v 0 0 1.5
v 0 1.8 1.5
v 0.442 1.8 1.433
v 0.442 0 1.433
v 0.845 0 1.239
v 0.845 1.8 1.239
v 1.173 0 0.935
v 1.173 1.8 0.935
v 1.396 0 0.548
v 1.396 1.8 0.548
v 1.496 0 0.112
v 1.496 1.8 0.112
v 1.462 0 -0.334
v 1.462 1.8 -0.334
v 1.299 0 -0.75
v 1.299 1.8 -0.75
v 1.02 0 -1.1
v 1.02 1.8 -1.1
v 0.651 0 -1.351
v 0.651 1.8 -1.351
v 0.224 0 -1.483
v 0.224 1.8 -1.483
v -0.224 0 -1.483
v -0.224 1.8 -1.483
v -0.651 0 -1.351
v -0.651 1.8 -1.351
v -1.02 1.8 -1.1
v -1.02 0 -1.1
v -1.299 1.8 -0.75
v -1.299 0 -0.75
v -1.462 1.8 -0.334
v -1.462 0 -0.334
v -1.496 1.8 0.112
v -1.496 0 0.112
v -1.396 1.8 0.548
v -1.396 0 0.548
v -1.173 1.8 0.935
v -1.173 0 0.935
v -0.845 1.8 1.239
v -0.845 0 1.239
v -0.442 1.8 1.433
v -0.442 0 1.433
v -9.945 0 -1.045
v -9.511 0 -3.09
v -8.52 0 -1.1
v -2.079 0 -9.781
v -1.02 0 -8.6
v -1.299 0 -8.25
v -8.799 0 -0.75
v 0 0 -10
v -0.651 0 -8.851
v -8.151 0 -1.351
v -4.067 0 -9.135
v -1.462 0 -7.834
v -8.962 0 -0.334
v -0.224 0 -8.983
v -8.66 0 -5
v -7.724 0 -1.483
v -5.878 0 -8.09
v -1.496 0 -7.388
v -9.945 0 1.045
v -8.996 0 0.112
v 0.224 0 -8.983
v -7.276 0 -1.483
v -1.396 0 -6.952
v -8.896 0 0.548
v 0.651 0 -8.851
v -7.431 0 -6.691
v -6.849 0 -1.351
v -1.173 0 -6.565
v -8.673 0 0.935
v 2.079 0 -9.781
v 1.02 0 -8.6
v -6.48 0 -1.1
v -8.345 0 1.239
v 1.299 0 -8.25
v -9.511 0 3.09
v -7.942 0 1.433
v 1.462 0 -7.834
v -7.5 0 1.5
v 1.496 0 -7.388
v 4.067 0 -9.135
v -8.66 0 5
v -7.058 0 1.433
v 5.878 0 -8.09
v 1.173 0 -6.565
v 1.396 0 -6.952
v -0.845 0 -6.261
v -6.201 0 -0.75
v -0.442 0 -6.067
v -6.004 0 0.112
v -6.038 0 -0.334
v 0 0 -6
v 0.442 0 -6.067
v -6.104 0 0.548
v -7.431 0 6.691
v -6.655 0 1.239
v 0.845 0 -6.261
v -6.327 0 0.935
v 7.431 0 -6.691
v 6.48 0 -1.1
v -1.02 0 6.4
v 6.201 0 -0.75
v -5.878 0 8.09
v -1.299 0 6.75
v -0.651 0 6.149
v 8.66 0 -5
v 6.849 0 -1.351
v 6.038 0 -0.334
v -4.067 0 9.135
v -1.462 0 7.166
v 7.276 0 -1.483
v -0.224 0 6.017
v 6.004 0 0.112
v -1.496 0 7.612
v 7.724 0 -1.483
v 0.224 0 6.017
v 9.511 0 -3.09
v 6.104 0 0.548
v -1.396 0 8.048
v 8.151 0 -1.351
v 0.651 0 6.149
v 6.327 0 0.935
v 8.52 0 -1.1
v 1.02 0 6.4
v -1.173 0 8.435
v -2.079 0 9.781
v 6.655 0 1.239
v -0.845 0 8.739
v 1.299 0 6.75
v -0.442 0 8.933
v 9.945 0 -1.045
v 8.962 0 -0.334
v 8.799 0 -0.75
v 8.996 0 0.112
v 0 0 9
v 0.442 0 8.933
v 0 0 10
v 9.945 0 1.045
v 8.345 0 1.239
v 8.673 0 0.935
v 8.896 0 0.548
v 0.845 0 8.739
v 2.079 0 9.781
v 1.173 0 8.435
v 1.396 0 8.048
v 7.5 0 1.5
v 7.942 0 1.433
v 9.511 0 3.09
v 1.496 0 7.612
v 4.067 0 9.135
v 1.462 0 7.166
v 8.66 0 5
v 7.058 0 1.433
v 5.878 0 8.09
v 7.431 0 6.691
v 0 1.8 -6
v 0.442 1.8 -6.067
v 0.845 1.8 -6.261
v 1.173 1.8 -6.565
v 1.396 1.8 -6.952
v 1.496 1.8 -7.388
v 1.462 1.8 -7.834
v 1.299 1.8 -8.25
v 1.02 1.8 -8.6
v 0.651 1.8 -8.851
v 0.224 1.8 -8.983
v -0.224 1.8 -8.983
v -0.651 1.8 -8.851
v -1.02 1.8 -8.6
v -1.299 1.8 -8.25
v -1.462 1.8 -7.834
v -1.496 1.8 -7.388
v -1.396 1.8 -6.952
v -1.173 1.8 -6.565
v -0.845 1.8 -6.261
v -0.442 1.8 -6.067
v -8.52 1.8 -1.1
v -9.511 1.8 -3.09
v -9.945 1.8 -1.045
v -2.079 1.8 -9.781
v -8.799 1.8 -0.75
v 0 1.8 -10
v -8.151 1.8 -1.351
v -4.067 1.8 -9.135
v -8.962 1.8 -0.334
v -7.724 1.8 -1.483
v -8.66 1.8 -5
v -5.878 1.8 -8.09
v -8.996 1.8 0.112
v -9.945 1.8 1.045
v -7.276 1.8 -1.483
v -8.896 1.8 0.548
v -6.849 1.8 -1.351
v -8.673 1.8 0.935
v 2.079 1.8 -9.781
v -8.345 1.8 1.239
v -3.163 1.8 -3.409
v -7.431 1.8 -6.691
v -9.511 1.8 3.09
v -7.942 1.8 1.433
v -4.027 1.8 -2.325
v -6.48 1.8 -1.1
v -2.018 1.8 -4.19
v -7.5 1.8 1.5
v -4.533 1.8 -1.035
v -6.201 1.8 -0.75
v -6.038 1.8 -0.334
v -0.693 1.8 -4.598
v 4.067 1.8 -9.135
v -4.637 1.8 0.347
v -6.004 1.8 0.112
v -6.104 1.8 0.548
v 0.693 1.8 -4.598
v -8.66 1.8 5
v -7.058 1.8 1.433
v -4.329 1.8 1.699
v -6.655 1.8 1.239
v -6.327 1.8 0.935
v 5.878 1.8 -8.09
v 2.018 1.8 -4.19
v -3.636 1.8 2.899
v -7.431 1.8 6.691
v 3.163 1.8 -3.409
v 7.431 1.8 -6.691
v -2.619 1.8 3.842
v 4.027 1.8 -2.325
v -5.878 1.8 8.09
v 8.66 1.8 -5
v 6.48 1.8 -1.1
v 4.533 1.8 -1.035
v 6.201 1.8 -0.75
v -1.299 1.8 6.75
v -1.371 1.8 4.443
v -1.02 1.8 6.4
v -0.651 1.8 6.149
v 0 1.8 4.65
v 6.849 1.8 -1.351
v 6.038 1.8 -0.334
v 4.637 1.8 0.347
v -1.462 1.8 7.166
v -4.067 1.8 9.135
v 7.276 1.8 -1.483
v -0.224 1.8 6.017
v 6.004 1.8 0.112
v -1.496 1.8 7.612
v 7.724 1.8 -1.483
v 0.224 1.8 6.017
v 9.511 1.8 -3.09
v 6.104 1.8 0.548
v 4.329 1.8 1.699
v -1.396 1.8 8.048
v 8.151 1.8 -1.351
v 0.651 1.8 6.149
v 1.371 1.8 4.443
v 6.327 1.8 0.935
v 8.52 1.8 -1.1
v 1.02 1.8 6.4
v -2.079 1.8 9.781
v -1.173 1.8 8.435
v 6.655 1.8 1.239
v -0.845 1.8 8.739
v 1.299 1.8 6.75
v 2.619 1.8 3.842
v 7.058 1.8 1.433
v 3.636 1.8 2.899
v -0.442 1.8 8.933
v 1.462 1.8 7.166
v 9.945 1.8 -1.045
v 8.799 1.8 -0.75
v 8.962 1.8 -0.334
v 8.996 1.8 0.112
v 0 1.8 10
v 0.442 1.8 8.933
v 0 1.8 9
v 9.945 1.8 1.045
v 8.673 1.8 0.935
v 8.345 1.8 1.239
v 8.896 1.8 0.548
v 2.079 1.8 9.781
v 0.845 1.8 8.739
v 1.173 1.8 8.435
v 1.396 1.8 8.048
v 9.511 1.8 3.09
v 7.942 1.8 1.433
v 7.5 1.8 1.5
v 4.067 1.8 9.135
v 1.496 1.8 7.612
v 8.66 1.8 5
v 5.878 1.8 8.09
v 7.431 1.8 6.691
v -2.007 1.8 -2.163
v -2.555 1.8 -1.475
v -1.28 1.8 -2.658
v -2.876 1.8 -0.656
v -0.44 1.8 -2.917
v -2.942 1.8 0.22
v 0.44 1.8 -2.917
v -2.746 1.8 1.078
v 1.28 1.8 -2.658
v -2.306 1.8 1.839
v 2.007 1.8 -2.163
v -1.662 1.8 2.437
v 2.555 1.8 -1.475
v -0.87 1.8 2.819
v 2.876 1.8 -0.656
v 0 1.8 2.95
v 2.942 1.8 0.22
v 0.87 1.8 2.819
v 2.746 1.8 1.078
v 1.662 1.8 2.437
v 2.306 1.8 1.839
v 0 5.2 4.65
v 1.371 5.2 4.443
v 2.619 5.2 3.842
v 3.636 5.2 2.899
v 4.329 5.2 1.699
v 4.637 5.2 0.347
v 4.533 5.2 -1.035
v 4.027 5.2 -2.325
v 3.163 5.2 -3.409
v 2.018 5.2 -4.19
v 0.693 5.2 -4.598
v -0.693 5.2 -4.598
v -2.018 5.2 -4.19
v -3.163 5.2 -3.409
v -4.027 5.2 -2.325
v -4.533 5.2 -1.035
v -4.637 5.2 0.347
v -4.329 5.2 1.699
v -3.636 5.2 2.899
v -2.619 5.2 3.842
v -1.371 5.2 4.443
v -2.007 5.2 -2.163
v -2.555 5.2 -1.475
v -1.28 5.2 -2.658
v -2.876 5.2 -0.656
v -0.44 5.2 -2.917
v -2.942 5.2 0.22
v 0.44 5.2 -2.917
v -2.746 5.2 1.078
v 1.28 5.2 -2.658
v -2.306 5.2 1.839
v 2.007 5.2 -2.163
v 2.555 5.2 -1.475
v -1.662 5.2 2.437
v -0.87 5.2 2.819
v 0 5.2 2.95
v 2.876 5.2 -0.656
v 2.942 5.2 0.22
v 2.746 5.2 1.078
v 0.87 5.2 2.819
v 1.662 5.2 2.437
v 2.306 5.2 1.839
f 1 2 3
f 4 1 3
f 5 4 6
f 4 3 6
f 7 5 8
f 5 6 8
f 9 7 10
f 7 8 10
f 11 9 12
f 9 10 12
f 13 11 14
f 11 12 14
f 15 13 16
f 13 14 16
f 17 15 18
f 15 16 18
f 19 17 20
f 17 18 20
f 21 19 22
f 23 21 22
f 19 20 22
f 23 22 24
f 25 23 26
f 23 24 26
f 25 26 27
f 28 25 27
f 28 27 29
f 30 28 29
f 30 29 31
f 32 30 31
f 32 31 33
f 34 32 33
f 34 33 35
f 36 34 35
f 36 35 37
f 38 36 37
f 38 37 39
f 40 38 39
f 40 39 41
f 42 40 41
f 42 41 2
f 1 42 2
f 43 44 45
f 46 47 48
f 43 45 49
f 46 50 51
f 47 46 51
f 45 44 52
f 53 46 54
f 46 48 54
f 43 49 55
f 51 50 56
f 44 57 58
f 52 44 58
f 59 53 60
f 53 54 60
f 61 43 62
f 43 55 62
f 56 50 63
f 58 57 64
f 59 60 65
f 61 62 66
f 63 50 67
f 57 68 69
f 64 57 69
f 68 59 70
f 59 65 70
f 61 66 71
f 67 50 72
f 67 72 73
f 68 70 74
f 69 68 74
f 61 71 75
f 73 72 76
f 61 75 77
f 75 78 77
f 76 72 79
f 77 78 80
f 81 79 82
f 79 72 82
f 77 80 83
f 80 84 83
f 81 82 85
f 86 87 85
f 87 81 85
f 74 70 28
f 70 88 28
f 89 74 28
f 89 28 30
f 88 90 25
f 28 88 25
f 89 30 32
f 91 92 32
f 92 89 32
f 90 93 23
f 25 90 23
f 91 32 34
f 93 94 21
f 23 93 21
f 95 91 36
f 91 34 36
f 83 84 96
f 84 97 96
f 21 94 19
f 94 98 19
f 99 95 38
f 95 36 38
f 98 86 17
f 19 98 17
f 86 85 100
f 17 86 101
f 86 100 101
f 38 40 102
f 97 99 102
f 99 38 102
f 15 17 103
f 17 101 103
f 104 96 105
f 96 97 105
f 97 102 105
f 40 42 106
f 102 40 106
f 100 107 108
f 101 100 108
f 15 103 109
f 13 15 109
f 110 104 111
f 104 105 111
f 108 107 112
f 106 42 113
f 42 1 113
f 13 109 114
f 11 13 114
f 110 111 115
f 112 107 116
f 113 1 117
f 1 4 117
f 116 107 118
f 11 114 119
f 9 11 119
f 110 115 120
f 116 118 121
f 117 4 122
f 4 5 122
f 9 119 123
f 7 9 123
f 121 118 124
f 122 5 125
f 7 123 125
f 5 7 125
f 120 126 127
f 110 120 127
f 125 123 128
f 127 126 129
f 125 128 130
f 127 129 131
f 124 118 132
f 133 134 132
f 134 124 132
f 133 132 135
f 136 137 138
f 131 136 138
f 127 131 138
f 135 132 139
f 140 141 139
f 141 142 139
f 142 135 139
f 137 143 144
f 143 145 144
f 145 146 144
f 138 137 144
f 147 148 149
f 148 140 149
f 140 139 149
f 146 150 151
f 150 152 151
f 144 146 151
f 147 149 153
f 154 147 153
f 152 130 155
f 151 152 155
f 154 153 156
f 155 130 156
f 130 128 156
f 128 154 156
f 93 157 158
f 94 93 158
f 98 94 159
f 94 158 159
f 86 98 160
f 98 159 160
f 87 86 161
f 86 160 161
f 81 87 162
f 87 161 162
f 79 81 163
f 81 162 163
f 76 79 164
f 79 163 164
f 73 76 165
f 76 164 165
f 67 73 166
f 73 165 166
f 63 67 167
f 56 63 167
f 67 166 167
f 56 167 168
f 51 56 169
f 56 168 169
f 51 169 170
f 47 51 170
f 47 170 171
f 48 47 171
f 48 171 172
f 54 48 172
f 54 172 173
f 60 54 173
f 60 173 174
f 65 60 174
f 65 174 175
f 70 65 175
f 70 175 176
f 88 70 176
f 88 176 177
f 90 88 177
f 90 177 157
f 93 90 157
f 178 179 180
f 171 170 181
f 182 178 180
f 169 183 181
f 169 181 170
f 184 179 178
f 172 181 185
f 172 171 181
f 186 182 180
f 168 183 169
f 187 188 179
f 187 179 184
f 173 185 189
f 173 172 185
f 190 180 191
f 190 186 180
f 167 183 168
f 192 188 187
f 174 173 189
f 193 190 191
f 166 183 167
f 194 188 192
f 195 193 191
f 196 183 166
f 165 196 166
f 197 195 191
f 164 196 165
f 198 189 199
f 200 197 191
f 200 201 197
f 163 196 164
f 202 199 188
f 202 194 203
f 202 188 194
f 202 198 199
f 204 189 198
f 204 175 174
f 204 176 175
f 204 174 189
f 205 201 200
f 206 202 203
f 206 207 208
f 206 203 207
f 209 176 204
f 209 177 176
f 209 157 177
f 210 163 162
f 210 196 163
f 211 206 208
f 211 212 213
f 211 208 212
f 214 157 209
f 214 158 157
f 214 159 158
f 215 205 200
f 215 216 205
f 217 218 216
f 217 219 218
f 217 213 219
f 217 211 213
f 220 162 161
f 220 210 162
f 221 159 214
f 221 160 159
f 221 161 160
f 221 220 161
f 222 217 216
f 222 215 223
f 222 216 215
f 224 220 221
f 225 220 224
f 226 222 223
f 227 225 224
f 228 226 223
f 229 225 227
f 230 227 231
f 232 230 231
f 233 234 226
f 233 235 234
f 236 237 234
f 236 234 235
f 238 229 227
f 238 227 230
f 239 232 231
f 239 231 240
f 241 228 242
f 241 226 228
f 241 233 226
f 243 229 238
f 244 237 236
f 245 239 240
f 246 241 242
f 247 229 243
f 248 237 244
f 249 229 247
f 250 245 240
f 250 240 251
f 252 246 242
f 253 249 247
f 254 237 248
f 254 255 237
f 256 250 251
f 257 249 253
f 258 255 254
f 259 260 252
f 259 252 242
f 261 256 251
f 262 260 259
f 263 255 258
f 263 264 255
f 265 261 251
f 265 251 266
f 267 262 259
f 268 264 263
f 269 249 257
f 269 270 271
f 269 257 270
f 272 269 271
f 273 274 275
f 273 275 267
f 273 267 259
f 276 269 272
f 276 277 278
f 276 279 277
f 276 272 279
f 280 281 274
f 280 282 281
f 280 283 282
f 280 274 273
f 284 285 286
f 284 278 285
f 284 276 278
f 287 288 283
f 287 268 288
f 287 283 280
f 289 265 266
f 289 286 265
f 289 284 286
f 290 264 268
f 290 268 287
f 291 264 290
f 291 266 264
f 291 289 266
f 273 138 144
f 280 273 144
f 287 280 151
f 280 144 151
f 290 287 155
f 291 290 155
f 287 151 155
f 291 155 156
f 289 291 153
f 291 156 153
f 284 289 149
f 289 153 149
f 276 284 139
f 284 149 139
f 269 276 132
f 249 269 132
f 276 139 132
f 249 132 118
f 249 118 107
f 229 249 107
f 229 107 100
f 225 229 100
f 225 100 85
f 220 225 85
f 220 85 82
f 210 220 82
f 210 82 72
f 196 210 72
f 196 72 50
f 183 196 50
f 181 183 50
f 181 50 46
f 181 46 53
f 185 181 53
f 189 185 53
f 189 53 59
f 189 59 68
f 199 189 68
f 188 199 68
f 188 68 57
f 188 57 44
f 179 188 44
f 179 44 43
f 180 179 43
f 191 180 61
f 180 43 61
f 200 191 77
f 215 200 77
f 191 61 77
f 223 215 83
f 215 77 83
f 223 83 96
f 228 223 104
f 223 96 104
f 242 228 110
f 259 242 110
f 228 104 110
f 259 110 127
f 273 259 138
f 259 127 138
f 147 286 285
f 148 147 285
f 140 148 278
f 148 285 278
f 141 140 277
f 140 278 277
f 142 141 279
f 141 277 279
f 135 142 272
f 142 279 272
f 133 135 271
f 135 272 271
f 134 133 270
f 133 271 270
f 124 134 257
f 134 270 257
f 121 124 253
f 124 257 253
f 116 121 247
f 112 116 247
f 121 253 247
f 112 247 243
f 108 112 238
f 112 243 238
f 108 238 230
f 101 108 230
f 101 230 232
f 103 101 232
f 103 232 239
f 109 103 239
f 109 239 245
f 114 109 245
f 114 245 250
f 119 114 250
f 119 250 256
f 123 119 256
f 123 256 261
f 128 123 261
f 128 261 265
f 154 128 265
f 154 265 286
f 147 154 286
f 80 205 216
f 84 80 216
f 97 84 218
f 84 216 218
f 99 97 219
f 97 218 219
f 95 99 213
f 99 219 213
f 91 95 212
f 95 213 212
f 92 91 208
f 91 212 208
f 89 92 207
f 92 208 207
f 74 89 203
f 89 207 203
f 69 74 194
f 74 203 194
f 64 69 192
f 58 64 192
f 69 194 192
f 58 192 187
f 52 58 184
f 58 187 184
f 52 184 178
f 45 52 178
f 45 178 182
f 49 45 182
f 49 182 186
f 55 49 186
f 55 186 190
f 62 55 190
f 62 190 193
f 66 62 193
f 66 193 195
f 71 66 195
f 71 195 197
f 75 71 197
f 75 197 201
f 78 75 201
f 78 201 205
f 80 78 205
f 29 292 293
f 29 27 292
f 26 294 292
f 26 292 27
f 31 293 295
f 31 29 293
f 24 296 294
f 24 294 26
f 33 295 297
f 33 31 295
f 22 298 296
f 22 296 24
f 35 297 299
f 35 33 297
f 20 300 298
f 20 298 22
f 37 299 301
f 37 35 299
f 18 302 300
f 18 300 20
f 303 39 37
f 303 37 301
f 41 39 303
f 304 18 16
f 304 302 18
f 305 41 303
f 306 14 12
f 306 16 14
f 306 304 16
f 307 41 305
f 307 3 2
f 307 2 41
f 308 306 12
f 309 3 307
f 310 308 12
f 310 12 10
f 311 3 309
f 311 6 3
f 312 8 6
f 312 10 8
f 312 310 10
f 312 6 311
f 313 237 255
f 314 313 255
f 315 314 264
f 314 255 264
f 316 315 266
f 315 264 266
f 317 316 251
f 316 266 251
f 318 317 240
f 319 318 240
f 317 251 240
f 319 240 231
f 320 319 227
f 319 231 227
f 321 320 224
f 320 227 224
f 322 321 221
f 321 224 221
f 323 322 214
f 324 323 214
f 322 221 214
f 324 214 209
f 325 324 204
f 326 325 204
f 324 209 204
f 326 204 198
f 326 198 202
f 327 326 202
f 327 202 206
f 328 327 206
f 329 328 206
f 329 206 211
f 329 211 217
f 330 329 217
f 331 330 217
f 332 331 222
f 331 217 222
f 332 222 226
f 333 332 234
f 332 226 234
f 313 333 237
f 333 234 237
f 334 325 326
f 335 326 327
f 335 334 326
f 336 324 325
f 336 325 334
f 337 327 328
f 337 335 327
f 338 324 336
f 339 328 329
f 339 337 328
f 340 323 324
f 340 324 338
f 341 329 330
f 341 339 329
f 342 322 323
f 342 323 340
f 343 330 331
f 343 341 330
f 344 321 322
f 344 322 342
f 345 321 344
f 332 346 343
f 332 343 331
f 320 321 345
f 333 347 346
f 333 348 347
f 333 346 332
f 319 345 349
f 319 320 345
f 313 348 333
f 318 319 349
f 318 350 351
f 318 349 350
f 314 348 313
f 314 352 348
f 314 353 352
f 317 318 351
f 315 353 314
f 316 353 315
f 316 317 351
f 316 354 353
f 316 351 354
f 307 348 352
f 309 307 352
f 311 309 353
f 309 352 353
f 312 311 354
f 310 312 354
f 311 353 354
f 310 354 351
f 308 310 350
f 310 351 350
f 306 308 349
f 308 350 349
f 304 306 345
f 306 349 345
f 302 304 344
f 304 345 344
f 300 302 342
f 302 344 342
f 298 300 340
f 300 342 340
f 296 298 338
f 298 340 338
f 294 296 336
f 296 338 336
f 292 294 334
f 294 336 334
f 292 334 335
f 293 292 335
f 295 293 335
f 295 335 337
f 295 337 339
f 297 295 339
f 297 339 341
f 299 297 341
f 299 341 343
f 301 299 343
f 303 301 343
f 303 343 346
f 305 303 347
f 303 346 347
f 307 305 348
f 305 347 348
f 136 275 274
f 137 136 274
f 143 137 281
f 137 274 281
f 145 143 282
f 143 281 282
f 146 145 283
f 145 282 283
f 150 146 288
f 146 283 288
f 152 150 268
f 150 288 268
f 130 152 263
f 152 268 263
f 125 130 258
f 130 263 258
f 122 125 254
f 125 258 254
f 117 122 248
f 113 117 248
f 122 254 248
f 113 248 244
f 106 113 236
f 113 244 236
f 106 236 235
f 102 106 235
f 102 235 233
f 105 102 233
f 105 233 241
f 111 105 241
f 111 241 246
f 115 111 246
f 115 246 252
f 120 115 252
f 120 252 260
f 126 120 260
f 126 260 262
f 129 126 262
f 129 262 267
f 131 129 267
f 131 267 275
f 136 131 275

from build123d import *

# Parameters (mm, degrees)
SKETCH1_R           = 10
BOSS_EXTRUDE1_DEPTH = 5.2
CUT_EXTRUDE1_START  = -3.4
SKETCH2_R           = 10
SKETCH2_R_2         = 4.65
CUT_EXTRUDE1_DEPTH  = 3.4
CUT_EXTRUDE2_REACH  = 16.545
SKETCH3_R           = 1.5
SKETCH4_R           = 2.95
CUT_EXTRUDE3_DEPTH  = 3.4


with BuildPart() as part:
    # Sketch1 → Boss-Extrude1 (new body)
    with BuildSketch(Plane(origin=(0, 0, 0), x_dir=(1, 0, 0), z_dir=(0, 1, 0))):
        with Locations(Location((0, 0, 0), (0, 0, 270))):
            Circle(SKETCH1_R)
    extrude(amount=BOSS_EXTRUDE1_DEPTH)

    # Sketch2 → Cut-Extrude1 (cut)
    with BuildSketch(Plane(origin=(0, 5.2, 0), x_dir=(1, 0, 0), z_dir=(0, 1, 0)).offset(CUT_EXTRUDE1_START)):
        with Locations(Location((0, 0, 0), (0, 0, 270))):
            Circle(SKETCH2_R)
        with Locations(Location((0, 0, 0), (0, 0, 270))):
            Circle(SKETCH2_R_2, mode=Mode.SUBTRACT)
    extrude(amount=CUT_EXTRUDE1_DEPTH, mode=Mode.SUBTRACT)

    # Sketch3 → Cut-Extrude2 (cut, up to next)
    with BuildSketch(Plane(origin=(0, 1.8, 0), x_dir=(1, 0, 0), z_dir=(0, 1, 0)), mode=Mode.PRIVATE) as cut_extrude2_sk1:
        with Locations(Location((0, 0, 0), (0, 0, 270))):
            Circle(SKETCH3_R)
    cut_extrude2_tool1 = extrude(cut_extrude2_sk1.sketch, amount=-CUT_EXTRUDE2_REACH, mode=Mode.PRIVATE) & part.part
    # Sketch3 → Cut-Extrude2 (cut, up to next)
    with BuildSketch(Plane(origin=(0, 1.8, 0), x_dir=(1, 0, 0), z_dir=(0, 1, 0)), mode=Mode.PRIVATE) as cut_extrude2_sk2:
        with Locations(Location((-7.5, 0, 0), (0, 0, 270))):
            Circle(SKETCH3_R)
    cut_extrude2_tool2 = extrude(cut_extrude2_sk2.sketch, amount=-CUT_EXTRUDE2_REACH, mode=Mode.PRIVATE) & part.part
    # Sketch3 → Cut-Extrude2 (cut, up to next)
    with BuildSketch(Plane(origin=(0, 1.8, 0), x_dir=(1, 0, 0), z_dir=(0, 1, 0)), mode=Mode.PRIVATE) as cut_extrude2_sk3:
        with Locations(Location((0, 7.5, 0), (0, 0, 270))):
            Circle(SKETCH3_R)
    cut_extrude2_tool3 = extrude(cut_extrude2_sk3.sketch, amount=-CUT_EXTRUDE2_REACH, mode=Mode.PRIVATE) & part.part
    # Sketch3 → Cut-Extrude2 (cut, up to next)
    with BuildSketch(Plane(origin=(0, 1.8, 0), x_dir=(1, 0, 0), z_dir=(0, 1, 0)), mode=Mode.PRIVATE) as cut_extrude2_sk4:
        with Locations(Location((7.5, 0, 0), (0, 0, 270))):
            Circle(SKETCH3_R)
    cut_extrude2_tool4 = extrude(cut_extrude2_sk4.sketch, amount=-CUT_EXTRUDE2_REACH, mode=Mode.PRIVATE) & part.part
    # Sketch3 → Cut-Extrude2 (cut, up to next)
    with BuildSketch(Plane(origin=(0, 1.8, 0), x_dir=(1, 0, 0), z_dir=(0, 1, 0)), mode=Mode.PRIVATE) as cut_extrude2_sk5:
        with Locations(Location((0, -7.5, 0), (0, 0, 270))):
            Circle(SKETCH3_R)
    cut_extrude2_tool5 = extrude(cut_extrude2_sk5.sketch, amount=-CUT_EXTRUDE2_REACH, mode=Mode.PRIVATE) & part.part
    add(cut_extrude2_tool1.solids().sort_by_distance((0, 1.8, 0))[0], mode=Mode.SUBTRACT)
    add(cut_extrude2_tool2.solids().sort_by_distance((-7.5, 1.8, 0))[0], mode=Mode.SUBTRACT)
    add(cut_extrude2_tool3.solids().sort_by_distance((0, 1.8, -7.5))[0], mode=Mode.SUBTRACT)
    add(cut_extrude2_tool4.solids().sort_by_distance((7.5, 1.8, 0))[0], mode=Mode.SUBTRACT)
    add(cut_extrude2_tool5.solids().sort_by_distance((0, 1.8, 7.5))[0], mode=Mode.SUBTRACT)

    # Sketch4 → Cut-Extrude3 (cut)
    with BuildSketch(Plane(origin=(0, 5.2, 0), x_dir=(1, 0, 0), z_dir=(0, 1, 0))):
        with Locations(Location((0, 0, 0), (0, 0, 270))):
            Circle(SKETCH4_R)
    extrude(amount=-CUT_EXTRUDE3_DEPTH, mode=Mode.SUBTRACT)


solid = part.part
